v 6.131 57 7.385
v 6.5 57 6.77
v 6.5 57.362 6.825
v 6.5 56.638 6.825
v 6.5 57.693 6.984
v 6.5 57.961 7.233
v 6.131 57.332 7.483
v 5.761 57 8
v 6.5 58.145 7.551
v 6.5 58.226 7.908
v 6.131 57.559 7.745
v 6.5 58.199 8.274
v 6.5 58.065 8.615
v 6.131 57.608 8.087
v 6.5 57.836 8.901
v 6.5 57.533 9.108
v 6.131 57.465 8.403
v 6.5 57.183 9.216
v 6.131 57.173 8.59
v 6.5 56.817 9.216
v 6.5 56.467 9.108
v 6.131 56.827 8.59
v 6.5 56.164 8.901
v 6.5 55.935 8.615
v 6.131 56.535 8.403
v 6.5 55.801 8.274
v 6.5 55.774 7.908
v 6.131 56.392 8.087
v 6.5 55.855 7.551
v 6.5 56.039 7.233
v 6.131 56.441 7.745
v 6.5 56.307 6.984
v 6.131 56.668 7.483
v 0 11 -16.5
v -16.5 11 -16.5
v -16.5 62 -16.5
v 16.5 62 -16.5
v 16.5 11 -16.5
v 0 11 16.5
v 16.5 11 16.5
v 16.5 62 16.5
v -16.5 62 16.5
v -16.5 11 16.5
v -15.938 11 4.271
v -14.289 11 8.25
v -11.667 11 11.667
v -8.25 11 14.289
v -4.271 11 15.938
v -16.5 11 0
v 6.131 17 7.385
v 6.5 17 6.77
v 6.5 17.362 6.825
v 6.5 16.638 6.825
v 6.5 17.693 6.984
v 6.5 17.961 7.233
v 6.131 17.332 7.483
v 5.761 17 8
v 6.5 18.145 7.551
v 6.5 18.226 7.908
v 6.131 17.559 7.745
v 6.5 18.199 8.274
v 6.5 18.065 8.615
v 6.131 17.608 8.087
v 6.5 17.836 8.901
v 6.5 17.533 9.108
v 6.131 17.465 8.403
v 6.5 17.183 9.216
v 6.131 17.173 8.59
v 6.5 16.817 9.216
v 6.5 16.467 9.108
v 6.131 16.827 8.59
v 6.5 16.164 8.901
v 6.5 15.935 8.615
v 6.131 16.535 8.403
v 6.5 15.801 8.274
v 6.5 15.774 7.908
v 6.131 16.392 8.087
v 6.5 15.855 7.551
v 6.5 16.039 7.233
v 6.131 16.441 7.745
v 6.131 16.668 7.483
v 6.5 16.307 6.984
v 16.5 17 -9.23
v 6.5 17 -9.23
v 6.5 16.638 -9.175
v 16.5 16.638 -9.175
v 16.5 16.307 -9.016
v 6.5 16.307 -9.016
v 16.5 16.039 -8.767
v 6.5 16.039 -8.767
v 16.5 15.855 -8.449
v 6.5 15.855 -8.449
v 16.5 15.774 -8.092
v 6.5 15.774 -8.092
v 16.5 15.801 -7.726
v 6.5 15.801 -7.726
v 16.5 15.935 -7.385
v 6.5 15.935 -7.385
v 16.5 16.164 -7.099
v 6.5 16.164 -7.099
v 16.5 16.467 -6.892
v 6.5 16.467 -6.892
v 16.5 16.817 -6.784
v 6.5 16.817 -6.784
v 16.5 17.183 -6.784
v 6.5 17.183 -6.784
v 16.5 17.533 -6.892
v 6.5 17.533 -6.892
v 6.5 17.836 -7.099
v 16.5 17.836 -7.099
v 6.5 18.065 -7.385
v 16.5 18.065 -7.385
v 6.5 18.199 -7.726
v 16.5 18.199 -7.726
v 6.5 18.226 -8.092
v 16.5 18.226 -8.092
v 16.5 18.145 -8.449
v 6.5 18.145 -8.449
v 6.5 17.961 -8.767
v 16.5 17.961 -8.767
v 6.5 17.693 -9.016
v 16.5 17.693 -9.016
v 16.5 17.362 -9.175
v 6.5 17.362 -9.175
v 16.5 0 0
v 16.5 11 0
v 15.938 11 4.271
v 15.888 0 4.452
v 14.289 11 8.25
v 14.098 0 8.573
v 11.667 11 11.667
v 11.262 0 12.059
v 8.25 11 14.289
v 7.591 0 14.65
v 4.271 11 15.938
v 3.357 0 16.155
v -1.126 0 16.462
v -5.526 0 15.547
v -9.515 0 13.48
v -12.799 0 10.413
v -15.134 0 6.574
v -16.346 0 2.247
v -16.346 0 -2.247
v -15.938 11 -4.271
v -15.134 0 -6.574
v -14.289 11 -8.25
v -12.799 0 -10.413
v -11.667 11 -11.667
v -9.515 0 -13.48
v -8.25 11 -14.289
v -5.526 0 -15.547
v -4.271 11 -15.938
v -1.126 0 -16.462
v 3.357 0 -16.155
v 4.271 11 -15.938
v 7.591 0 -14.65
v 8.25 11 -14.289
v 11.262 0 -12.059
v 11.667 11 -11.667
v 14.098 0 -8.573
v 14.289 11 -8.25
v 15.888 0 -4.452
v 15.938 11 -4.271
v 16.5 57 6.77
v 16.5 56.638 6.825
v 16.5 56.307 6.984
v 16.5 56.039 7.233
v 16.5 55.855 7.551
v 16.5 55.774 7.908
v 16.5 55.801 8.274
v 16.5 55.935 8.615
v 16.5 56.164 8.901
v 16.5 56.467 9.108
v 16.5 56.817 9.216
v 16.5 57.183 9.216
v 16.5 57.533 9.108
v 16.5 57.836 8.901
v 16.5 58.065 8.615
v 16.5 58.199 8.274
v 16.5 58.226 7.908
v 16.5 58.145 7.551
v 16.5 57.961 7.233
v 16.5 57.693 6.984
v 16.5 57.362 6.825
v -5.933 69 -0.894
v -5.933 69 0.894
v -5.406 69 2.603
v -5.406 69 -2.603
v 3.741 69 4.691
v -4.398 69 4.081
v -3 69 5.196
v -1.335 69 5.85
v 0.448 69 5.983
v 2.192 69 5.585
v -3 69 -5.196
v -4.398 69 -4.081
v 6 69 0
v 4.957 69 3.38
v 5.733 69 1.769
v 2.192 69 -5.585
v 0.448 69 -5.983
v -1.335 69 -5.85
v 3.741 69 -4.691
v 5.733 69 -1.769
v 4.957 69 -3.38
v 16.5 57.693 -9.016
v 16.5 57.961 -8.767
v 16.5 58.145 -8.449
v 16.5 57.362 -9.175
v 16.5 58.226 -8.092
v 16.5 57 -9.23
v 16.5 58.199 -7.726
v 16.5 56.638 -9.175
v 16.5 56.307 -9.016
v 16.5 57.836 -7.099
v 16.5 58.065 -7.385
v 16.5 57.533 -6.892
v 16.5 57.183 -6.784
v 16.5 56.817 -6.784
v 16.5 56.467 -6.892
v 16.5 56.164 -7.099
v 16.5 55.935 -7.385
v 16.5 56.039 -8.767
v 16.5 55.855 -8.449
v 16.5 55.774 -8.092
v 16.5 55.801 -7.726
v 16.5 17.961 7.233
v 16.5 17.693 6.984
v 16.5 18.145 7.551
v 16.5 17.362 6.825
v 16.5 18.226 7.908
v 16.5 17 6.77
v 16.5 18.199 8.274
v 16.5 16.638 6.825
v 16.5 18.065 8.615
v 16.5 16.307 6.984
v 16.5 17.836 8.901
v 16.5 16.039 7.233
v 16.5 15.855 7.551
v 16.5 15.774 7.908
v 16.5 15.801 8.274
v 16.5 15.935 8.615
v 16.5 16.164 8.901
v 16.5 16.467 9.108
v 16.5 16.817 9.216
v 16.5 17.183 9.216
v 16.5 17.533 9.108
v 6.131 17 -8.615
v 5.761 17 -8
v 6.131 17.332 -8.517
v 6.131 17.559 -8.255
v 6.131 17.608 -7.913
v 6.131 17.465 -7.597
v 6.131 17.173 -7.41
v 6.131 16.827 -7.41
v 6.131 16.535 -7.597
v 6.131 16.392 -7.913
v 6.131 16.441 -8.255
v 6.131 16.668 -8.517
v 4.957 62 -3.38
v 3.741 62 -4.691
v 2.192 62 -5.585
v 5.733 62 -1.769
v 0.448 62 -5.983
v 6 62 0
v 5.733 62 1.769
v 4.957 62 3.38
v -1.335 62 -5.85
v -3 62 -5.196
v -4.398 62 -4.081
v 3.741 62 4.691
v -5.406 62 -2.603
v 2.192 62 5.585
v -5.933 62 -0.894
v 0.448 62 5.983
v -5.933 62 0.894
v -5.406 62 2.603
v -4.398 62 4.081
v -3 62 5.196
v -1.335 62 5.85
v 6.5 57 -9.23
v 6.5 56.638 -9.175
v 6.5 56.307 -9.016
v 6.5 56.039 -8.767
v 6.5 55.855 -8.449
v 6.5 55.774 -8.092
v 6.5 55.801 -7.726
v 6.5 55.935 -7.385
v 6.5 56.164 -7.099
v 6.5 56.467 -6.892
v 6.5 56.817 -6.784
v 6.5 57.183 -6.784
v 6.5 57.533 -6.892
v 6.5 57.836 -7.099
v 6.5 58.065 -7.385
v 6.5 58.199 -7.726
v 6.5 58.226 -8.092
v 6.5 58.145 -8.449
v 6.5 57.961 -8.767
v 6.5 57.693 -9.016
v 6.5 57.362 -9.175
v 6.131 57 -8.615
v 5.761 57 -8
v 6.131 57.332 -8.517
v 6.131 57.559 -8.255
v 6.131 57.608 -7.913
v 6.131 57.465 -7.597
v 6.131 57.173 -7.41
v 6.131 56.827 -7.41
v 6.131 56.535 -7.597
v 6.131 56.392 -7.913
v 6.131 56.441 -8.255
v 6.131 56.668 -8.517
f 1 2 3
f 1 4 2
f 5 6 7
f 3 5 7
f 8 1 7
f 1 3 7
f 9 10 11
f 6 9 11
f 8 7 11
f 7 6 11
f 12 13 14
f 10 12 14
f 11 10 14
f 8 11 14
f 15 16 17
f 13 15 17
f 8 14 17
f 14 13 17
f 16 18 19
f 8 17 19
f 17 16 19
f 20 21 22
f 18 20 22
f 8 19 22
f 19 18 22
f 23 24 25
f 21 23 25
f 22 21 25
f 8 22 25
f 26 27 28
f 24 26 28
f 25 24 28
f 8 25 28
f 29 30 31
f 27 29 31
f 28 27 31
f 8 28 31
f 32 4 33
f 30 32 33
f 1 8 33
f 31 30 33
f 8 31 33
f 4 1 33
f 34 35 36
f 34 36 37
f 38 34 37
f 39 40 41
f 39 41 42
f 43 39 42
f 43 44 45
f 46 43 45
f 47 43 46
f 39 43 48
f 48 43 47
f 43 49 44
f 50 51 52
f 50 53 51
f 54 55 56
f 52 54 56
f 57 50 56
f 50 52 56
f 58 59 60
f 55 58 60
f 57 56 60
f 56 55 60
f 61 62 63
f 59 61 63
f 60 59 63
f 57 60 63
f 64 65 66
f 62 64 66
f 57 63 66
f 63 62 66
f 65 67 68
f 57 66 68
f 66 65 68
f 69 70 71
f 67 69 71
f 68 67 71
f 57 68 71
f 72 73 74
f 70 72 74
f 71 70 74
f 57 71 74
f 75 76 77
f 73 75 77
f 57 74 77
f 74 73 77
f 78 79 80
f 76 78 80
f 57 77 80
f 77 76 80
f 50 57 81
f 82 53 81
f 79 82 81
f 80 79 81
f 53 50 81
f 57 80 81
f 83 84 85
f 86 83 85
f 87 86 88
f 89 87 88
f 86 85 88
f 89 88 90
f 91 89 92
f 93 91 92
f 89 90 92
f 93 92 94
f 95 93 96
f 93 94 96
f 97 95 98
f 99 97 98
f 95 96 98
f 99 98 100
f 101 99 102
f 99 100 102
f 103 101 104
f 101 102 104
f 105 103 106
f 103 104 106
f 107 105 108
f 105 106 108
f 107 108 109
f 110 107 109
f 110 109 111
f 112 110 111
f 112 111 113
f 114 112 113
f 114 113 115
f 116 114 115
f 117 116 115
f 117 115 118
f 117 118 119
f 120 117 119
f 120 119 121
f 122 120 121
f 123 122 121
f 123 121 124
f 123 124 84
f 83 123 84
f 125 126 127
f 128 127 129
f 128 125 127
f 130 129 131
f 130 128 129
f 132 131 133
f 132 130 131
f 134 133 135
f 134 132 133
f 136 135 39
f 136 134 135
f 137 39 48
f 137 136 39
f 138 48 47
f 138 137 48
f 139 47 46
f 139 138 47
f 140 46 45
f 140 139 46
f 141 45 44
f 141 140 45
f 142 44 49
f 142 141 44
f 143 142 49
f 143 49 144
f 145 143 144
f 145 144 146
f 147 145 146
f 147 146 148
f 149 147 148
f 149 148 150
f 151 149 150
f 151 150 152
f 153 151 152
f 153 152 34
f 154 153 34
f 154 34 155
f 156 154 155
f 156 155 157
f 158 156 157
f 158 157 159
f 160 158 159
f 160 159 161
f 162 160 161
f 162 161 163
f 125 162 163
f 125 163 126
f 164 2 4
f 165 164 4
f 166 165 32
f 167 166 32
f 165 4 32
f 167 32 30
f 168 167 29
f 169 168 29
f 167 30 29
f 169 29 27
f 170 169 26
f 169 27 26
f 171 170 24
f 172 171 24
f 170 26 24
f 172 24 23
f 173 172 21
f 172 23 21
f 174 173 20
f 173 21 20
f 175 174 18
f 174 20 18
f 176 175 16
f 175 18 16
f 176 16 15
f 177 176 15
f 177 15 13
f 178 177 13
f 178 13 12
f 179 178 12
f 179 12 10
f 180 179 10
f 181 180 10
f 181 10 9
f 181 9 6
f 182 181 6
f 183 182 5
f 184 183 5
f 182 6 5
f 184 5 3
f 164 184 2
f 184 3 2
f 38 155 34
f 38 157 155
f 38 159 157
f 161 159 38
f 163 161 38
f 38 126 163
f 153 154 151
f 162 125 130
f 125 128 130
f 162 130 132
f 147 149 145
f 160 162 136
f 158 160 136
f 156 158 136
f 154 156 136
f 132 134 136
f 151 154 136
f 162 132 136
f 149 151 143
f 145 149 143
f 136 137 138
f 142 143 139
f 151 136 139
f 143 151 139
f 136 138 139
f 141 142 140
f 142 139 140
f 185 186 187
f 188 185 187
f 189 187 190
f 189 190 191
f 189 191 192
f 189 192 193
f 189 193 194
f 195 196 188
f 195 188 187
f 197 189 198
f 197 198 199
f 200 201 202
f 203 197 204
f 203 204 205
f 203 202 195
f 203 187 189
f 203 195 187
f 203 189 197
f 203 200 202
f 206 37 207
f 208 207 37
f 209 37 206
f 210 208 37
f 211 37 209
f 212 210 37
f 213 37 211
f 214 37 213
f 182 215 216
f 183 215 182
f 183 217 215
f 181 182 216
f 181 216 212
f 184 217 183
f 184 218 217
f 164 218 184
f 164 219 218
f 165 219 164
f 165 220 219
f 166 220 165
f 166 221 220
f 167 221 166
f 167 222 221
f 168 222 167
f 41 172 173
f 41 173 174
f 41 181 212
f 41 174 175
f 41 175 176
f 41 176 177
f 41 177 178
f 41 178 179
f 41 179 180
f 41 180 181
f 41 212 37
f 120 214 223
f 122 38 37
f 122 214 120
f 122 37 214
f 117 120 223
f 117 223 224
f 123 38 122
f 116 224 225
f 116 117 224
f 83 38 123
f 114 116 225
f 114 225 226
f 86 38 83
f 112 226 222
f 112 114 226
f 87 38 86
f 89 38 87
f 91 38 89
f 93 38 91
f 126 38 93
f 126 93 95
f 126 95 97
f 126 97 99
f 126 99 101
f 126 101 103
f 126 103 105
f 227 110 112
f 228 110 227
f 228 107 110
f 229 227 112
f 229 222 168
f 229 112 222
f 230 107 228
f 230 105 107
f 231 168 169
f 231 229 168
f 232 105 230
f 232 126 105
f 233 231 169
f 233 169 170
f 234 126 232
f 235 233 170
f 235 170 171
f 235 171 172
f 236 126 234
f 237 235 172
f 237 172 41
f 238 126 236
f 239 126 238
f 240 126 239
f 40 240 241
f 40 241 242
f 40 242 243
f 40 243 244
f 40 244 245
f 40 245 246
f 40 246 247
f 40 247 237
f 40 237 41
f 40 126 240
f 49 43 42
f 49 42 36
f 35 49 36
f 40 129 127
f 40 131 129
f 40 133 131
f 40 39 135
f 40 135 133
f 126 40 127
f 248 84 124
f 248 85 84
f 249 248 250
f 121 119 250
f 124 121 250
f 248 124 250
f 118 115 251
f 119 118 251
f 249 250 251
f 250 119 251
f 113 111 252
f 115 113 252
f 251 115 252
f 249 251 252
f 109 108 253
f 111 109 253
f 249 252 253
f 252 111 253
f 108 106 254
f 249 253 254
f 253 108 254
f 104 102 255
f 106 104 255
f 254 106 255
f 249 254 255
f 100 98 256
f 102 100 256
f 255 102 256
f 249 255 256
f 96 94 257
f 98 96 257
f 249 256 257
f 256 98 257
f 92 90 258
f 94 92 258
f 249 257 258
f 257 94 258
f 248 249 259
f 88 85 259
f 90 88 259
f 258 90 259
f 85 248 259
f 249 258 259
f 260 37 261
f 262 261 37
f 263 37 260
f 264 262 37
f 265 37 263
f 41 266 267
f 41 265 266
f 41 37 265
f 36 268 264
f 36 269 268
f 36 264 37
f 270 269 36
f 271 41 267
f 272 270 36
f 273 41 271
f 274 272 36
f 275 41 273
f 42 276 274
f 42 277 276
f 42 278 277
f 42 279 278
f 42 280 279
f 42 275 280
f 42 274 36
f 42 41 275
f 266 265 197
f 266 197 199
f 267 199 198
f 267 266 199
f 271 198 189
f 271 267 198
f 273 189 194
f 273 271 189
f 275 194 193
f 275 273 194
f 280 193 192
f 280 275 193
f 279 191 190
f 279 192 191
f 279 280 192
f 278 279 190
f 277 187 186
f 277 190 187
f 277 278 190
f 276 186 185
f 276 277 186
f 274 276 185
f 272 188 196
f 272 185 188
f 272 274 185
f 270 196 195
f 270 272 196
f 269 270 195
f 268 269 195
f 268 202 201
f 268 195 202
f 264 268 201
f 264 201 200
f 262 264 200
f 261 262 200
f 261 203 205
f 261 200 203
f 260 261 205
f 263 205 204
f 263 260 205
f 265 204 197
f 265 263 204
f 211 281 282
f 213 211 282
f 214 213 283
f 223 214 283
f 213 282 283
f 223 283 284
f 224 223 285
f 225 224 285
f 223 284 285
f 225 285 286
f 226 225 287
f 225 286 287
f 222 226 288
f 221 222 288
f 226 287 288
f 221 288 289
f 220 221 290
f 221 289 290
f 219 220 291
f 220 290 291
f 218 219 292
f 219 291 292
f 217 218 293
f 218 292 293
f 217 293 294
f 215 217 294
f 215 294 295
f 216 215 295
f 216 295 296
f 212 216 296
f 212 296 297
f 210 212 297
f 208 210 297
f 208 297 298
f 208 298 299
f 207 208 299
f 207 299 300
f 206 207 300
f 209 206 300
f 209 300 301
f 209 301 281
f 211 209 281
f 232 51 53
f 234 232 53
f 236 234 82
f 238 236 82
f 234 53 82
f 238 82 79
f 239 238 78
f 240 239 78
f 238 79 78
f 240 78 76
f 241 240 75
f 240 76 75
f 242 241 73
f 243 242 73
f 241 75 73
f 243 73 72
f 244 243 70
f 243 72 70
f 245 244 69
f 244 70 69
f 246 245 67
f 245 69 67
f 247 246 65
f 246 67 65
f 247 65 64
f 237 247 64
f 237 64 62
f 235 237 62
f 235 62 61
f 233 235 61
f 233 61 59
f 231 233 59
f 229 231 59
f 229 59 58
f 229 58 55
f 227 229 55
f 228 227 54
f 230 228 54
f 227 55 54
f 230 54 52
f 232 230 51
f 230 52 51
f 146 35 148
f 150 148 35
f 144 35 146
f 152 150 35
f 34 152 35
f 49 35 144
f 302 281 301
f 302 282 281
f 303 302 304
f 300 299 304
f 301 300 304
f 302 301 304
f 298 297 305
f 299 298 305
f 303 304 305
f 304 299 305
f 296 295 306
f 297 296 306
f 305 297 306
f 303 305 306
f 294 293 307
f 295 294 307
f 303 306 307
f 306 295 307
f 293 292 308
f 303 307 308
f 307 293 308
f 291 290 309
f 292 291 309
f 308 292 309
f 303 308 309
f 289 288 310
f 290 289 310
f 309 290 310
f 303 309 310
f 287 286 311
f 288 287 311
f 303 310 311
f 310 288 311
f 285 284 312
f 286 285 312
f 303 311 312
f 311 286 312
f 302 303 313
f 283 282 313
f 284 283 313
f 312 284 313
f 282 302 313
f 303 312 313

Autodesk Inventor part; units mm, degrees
ref_plane "YZ Plane" through (0, 0, 0) normal (1, 0, 0) x (0, 1, 0)
ref_plane "XZ Plane" through (0, 0, 0) normal (0, 1, 0) x (-1, 0, 0)
ref_plane "XY Plane" through (0, 0, 0) normal (0, 0, 1) x (1, 0, 0)
sketch "Sketch1" plane through (0, 0, 0) normal (0, 1, 0) x (-1, 0, 0)
  line L0 (-16.5, 16.5) -> (16.5, 16.5)
  line L1 (16.5, 16.5) -> (16.5, -16.5)
  line L2 (16.5, -16.5) -> (-16.5, -16.5)
  line L3 (-16.5, -16.5) -> (-16.5, 16.5)
  line L4 (-16.5, 16.5) -> (16.5, -16.5) construction
  line L5 (16.5, 16.5) -> (-16.5, -16.5) construction
  point P0 (0, 0)
  dimension "d0" = 33
  dimension "d1" = 33
extrude "Extrusion1" add sketch "Sketch1" along normal blind 62
sketch "Sketch2" plane through (0, 62, 0) normal (0, 1, 0) x (1, 0, 0)
  circle A0 centre (0, 0) radius 6
  dimension "d4" = 12
extrude "Extrusion2" add sketch "Sketch2" along normal blind 7
sketch "Sketch3" plane through (16.5, 0, 16.5) normal (1, 0, 0) x (0, 0, -1)
  circle A0 centre (8.5, 57) radius 1.575
  line L0 (-0.0785, 57) -> (33, 57)
  line L1 (33, 0) -> (33, 62) projected
  line L2 (0, 62) -> (33, 62) projected
  line L3 (33, 62) -> (0, 62) projected
  line L4 (16.5, 62) -> (16.5, 57)
  line L5 (0, 17) -> (33, 17)
  line L6 (16.5, 57) -> (16.5, 17)
  line L7 (16.5, 37) -> (33, 37)
  circle A1 centre (24.5, 57) radius 1.575
  circle A2 centre (8.5, 17) radius 1.575
  circle A3 centre (24.5, 17) radius 1.575
  point P0 (16.5, 0)
  dimension "d7" = 3.15
  dimension "d8" = 5
  dimension "d9" = 8
  dimension "d10" = 40
hole "Hole1" at (16.5, 57, 8) at (16.5, 57, -8) at (16.5, 17, 8) at (16.5, 17, -8) direction (-1, 0, 0) diameter 2.459 depth 10 tip angle 118 thread size "M3x0.5" class "6H" standard "ANSI Metric M Profile"
sketch "Sketch4" plane through (0, 0, 0) normal (0, -1, 0) x (1, 0, 0)
  circle A0 centre (0, 0) radius 16.5
  line L0 (16.5, -16.5) -> (-16.5, -16.5) projected
  line L1 (-16.5, 16.5) -> (16.5, 16.5)
  line L2 (16.5, 16.5) -> (16.5, -16.5)
  line L3 (16.5, -16.5) -> (-16.5, -16.5)
  line L4 (-16.5, -16.5) -> (-16.5, 16.5)
  line L5 (-16.5, 16.5) -> (16.5, -16.5) construction
  line L6 (16.5, 16.5) -> (-16.5, -16.5) construction
  dimension "d18" = 33
extrude "Extrusion3" cut sketch "Sketch4" against normal blind 11 contours L2 L0 A0 | A0 L1 L2 | A0 L4 L1 | L0 L4 A0
equation "\"d0\" = laser_y"
equation "\"d1\" = laser_z"
equation "\"d2\" = laser_x"
equation "\"d4\" = laser_diameter"
equation "\"d7\" = m3_diameter"
equation "\"d10\" = laser_screw_spacing_x"
equation "\"d18\" = laser_y"
equation "\"thick_acrylic\" = 5.88"
equation "\"thin_acrylic\" = 3.15"
equation "\"clear_acrylic\" = 3.15"
equation "\"wood_thickness\" = 6.72"
equation "\"al1_thickness\" = 1.5875"
equation "\"m3_diameter\" = 3.15"
equation "\"m4_diameter\" = 4.2"
equation "\"m5_diameter\" = 5.25"
equation "\"brass_insert_drill\" = 4"
equation "\"m5_brass_insert_drill\" = 6.7"
equation "\"m5_press_nut_drill\" = 6.35"
equation "\"m3_main_length\" = 14"
equation "\"m3_main_nut_width\" = 5.7"
equation "\"m3_main_nut_thickness\" = 2.5"
equation "\"m3_main_extra\" = 1"
equation "\"stepper_screw_space\" = 35"
equation "\"stepper_shaft_diameter\" = 5"
equation "\"stepper_body_diameter\" = 28"
equation "\"laser_body_diameter\" = 12"
equation "\"t_carrier\" = 6.72"
equation "\"t_wall\" = 5.88"
equation "\"t_window\" = 3.15"
equation "\"carrier_y\" = 181"
equation "\"carrier_z\" = 233.04"
equation "\"carrier_z2\" = 283.04"
equation "\"protection_slot\" = 30.2"
equation "\"protection_slot_offset\" = 37.75"
equation "\"protection_slot_length\" = 20.6"
equation "\"window_z\" = 185"
equation "\"window_y\" = 49.56"
equation "\"window_slot\" = 25"
equation "\"door_sensor\" = 35"
equation "\"reservoir_x\" = 151"
equation "\"reservoir_y\" = 151"
equation "\"linear_bearing_spacing\" = 207"
equation "\"linear_bearing_z\" = 304.8"
equation "\"threaded_rod_z\" = 203.2"
equation "\"motor_spacing\" = 287"
equation "\"t_tray\" = 3.15"
equation "\"tray_border\" = 15"
equation "\"tray_x\" = 151"
equation "\"tray_y\" = 181"
equation "\"bed_t\" = 1.5875"
equation "\"bed_y2\" = 45.96"
equation "\"bed_fold_x\" = 15"
equation "\"bed_gap\" = 0.3"
equation "\"t_inner_tray\" = 5.88"
equation "\"t_tape\" = 3"
equation "\"inner_tray_x\" = 145"
equation "\"inner_tray_y\" = 145"
equation "\"inner_tray_border\" = 5"
equation "\"inner_tray_radius\" = 24"
equation "\"t_bottom_clear\" = 3.15"
equation "\"bottom_clear_border\" = 5"
equation "\"brass_keep_out\" = 8"
equation "\"tape_keep_out\" = 2"
equation "\"tape_thickness\" = 2"
equation "\"t_crane\" = 6.72"
equation "\"crane_x\" = 244.56"
equation "\"end_stop_offset_x\" = 83"
equation "\"end_stop_spacing\" = 19"
equation "\"thumb_nut_offset_y\" = 11.72"
equation "\"thumb_nut_diameter\" = 7"
equation "\"z_min_from_center\" = 72.28"
equation "\"t_frame\" = 6.72"
equation "\"frame_top_z\" = 295"
equation "\"frame_bottom_z\" = 225"
equation "\"frame_y\" = 68.44"
equation "\"frame_border\" = 39.5"
equation "\"frame_foot_z\" = 49.5"
equation "\"frame_foot_extension\" = 6"
equation "\"frame_tilt\" = 0"
equation "\"printer_z\" = 289"
equation "\"lcd_x\" = 72"
equation "\"lcd_y\" = 25"
equation "\"subframe_y_offset\" = 27.5"
equation "\"laser_y_offset\" = 19.4"
equation "\"laser_diameter\" = 12"
equation "\"laser_y\" = 33"
equation "\"laser_z\" = 33"
equation "\"laser_x\" = 62"
equation "\"laser_screw_spacing_x\" = 40"
equation "\"laser_screw_spacing_y\" = 16"
equation "\"t_galvo_frame\" = 6.72"
equation "\"galvo_frame_x\" = 66"
equation "\"galvo_frame_z\" = 65"
equation "\"galvo_frame_y_offset\" = 27.5"
equation "\"drawer_x\" = 181"
equation "\"drawer_y\" = 49.56"
equation "\"drawer_z\" = 206.72"
equation "\"drawer_z_from_bottom\" = 25"
equation "\"drawer_foot_mount\" = 18"
equation "\"asym_key\" = 0"
equation "\"small_round\" = 2"
properties part number "laser"
